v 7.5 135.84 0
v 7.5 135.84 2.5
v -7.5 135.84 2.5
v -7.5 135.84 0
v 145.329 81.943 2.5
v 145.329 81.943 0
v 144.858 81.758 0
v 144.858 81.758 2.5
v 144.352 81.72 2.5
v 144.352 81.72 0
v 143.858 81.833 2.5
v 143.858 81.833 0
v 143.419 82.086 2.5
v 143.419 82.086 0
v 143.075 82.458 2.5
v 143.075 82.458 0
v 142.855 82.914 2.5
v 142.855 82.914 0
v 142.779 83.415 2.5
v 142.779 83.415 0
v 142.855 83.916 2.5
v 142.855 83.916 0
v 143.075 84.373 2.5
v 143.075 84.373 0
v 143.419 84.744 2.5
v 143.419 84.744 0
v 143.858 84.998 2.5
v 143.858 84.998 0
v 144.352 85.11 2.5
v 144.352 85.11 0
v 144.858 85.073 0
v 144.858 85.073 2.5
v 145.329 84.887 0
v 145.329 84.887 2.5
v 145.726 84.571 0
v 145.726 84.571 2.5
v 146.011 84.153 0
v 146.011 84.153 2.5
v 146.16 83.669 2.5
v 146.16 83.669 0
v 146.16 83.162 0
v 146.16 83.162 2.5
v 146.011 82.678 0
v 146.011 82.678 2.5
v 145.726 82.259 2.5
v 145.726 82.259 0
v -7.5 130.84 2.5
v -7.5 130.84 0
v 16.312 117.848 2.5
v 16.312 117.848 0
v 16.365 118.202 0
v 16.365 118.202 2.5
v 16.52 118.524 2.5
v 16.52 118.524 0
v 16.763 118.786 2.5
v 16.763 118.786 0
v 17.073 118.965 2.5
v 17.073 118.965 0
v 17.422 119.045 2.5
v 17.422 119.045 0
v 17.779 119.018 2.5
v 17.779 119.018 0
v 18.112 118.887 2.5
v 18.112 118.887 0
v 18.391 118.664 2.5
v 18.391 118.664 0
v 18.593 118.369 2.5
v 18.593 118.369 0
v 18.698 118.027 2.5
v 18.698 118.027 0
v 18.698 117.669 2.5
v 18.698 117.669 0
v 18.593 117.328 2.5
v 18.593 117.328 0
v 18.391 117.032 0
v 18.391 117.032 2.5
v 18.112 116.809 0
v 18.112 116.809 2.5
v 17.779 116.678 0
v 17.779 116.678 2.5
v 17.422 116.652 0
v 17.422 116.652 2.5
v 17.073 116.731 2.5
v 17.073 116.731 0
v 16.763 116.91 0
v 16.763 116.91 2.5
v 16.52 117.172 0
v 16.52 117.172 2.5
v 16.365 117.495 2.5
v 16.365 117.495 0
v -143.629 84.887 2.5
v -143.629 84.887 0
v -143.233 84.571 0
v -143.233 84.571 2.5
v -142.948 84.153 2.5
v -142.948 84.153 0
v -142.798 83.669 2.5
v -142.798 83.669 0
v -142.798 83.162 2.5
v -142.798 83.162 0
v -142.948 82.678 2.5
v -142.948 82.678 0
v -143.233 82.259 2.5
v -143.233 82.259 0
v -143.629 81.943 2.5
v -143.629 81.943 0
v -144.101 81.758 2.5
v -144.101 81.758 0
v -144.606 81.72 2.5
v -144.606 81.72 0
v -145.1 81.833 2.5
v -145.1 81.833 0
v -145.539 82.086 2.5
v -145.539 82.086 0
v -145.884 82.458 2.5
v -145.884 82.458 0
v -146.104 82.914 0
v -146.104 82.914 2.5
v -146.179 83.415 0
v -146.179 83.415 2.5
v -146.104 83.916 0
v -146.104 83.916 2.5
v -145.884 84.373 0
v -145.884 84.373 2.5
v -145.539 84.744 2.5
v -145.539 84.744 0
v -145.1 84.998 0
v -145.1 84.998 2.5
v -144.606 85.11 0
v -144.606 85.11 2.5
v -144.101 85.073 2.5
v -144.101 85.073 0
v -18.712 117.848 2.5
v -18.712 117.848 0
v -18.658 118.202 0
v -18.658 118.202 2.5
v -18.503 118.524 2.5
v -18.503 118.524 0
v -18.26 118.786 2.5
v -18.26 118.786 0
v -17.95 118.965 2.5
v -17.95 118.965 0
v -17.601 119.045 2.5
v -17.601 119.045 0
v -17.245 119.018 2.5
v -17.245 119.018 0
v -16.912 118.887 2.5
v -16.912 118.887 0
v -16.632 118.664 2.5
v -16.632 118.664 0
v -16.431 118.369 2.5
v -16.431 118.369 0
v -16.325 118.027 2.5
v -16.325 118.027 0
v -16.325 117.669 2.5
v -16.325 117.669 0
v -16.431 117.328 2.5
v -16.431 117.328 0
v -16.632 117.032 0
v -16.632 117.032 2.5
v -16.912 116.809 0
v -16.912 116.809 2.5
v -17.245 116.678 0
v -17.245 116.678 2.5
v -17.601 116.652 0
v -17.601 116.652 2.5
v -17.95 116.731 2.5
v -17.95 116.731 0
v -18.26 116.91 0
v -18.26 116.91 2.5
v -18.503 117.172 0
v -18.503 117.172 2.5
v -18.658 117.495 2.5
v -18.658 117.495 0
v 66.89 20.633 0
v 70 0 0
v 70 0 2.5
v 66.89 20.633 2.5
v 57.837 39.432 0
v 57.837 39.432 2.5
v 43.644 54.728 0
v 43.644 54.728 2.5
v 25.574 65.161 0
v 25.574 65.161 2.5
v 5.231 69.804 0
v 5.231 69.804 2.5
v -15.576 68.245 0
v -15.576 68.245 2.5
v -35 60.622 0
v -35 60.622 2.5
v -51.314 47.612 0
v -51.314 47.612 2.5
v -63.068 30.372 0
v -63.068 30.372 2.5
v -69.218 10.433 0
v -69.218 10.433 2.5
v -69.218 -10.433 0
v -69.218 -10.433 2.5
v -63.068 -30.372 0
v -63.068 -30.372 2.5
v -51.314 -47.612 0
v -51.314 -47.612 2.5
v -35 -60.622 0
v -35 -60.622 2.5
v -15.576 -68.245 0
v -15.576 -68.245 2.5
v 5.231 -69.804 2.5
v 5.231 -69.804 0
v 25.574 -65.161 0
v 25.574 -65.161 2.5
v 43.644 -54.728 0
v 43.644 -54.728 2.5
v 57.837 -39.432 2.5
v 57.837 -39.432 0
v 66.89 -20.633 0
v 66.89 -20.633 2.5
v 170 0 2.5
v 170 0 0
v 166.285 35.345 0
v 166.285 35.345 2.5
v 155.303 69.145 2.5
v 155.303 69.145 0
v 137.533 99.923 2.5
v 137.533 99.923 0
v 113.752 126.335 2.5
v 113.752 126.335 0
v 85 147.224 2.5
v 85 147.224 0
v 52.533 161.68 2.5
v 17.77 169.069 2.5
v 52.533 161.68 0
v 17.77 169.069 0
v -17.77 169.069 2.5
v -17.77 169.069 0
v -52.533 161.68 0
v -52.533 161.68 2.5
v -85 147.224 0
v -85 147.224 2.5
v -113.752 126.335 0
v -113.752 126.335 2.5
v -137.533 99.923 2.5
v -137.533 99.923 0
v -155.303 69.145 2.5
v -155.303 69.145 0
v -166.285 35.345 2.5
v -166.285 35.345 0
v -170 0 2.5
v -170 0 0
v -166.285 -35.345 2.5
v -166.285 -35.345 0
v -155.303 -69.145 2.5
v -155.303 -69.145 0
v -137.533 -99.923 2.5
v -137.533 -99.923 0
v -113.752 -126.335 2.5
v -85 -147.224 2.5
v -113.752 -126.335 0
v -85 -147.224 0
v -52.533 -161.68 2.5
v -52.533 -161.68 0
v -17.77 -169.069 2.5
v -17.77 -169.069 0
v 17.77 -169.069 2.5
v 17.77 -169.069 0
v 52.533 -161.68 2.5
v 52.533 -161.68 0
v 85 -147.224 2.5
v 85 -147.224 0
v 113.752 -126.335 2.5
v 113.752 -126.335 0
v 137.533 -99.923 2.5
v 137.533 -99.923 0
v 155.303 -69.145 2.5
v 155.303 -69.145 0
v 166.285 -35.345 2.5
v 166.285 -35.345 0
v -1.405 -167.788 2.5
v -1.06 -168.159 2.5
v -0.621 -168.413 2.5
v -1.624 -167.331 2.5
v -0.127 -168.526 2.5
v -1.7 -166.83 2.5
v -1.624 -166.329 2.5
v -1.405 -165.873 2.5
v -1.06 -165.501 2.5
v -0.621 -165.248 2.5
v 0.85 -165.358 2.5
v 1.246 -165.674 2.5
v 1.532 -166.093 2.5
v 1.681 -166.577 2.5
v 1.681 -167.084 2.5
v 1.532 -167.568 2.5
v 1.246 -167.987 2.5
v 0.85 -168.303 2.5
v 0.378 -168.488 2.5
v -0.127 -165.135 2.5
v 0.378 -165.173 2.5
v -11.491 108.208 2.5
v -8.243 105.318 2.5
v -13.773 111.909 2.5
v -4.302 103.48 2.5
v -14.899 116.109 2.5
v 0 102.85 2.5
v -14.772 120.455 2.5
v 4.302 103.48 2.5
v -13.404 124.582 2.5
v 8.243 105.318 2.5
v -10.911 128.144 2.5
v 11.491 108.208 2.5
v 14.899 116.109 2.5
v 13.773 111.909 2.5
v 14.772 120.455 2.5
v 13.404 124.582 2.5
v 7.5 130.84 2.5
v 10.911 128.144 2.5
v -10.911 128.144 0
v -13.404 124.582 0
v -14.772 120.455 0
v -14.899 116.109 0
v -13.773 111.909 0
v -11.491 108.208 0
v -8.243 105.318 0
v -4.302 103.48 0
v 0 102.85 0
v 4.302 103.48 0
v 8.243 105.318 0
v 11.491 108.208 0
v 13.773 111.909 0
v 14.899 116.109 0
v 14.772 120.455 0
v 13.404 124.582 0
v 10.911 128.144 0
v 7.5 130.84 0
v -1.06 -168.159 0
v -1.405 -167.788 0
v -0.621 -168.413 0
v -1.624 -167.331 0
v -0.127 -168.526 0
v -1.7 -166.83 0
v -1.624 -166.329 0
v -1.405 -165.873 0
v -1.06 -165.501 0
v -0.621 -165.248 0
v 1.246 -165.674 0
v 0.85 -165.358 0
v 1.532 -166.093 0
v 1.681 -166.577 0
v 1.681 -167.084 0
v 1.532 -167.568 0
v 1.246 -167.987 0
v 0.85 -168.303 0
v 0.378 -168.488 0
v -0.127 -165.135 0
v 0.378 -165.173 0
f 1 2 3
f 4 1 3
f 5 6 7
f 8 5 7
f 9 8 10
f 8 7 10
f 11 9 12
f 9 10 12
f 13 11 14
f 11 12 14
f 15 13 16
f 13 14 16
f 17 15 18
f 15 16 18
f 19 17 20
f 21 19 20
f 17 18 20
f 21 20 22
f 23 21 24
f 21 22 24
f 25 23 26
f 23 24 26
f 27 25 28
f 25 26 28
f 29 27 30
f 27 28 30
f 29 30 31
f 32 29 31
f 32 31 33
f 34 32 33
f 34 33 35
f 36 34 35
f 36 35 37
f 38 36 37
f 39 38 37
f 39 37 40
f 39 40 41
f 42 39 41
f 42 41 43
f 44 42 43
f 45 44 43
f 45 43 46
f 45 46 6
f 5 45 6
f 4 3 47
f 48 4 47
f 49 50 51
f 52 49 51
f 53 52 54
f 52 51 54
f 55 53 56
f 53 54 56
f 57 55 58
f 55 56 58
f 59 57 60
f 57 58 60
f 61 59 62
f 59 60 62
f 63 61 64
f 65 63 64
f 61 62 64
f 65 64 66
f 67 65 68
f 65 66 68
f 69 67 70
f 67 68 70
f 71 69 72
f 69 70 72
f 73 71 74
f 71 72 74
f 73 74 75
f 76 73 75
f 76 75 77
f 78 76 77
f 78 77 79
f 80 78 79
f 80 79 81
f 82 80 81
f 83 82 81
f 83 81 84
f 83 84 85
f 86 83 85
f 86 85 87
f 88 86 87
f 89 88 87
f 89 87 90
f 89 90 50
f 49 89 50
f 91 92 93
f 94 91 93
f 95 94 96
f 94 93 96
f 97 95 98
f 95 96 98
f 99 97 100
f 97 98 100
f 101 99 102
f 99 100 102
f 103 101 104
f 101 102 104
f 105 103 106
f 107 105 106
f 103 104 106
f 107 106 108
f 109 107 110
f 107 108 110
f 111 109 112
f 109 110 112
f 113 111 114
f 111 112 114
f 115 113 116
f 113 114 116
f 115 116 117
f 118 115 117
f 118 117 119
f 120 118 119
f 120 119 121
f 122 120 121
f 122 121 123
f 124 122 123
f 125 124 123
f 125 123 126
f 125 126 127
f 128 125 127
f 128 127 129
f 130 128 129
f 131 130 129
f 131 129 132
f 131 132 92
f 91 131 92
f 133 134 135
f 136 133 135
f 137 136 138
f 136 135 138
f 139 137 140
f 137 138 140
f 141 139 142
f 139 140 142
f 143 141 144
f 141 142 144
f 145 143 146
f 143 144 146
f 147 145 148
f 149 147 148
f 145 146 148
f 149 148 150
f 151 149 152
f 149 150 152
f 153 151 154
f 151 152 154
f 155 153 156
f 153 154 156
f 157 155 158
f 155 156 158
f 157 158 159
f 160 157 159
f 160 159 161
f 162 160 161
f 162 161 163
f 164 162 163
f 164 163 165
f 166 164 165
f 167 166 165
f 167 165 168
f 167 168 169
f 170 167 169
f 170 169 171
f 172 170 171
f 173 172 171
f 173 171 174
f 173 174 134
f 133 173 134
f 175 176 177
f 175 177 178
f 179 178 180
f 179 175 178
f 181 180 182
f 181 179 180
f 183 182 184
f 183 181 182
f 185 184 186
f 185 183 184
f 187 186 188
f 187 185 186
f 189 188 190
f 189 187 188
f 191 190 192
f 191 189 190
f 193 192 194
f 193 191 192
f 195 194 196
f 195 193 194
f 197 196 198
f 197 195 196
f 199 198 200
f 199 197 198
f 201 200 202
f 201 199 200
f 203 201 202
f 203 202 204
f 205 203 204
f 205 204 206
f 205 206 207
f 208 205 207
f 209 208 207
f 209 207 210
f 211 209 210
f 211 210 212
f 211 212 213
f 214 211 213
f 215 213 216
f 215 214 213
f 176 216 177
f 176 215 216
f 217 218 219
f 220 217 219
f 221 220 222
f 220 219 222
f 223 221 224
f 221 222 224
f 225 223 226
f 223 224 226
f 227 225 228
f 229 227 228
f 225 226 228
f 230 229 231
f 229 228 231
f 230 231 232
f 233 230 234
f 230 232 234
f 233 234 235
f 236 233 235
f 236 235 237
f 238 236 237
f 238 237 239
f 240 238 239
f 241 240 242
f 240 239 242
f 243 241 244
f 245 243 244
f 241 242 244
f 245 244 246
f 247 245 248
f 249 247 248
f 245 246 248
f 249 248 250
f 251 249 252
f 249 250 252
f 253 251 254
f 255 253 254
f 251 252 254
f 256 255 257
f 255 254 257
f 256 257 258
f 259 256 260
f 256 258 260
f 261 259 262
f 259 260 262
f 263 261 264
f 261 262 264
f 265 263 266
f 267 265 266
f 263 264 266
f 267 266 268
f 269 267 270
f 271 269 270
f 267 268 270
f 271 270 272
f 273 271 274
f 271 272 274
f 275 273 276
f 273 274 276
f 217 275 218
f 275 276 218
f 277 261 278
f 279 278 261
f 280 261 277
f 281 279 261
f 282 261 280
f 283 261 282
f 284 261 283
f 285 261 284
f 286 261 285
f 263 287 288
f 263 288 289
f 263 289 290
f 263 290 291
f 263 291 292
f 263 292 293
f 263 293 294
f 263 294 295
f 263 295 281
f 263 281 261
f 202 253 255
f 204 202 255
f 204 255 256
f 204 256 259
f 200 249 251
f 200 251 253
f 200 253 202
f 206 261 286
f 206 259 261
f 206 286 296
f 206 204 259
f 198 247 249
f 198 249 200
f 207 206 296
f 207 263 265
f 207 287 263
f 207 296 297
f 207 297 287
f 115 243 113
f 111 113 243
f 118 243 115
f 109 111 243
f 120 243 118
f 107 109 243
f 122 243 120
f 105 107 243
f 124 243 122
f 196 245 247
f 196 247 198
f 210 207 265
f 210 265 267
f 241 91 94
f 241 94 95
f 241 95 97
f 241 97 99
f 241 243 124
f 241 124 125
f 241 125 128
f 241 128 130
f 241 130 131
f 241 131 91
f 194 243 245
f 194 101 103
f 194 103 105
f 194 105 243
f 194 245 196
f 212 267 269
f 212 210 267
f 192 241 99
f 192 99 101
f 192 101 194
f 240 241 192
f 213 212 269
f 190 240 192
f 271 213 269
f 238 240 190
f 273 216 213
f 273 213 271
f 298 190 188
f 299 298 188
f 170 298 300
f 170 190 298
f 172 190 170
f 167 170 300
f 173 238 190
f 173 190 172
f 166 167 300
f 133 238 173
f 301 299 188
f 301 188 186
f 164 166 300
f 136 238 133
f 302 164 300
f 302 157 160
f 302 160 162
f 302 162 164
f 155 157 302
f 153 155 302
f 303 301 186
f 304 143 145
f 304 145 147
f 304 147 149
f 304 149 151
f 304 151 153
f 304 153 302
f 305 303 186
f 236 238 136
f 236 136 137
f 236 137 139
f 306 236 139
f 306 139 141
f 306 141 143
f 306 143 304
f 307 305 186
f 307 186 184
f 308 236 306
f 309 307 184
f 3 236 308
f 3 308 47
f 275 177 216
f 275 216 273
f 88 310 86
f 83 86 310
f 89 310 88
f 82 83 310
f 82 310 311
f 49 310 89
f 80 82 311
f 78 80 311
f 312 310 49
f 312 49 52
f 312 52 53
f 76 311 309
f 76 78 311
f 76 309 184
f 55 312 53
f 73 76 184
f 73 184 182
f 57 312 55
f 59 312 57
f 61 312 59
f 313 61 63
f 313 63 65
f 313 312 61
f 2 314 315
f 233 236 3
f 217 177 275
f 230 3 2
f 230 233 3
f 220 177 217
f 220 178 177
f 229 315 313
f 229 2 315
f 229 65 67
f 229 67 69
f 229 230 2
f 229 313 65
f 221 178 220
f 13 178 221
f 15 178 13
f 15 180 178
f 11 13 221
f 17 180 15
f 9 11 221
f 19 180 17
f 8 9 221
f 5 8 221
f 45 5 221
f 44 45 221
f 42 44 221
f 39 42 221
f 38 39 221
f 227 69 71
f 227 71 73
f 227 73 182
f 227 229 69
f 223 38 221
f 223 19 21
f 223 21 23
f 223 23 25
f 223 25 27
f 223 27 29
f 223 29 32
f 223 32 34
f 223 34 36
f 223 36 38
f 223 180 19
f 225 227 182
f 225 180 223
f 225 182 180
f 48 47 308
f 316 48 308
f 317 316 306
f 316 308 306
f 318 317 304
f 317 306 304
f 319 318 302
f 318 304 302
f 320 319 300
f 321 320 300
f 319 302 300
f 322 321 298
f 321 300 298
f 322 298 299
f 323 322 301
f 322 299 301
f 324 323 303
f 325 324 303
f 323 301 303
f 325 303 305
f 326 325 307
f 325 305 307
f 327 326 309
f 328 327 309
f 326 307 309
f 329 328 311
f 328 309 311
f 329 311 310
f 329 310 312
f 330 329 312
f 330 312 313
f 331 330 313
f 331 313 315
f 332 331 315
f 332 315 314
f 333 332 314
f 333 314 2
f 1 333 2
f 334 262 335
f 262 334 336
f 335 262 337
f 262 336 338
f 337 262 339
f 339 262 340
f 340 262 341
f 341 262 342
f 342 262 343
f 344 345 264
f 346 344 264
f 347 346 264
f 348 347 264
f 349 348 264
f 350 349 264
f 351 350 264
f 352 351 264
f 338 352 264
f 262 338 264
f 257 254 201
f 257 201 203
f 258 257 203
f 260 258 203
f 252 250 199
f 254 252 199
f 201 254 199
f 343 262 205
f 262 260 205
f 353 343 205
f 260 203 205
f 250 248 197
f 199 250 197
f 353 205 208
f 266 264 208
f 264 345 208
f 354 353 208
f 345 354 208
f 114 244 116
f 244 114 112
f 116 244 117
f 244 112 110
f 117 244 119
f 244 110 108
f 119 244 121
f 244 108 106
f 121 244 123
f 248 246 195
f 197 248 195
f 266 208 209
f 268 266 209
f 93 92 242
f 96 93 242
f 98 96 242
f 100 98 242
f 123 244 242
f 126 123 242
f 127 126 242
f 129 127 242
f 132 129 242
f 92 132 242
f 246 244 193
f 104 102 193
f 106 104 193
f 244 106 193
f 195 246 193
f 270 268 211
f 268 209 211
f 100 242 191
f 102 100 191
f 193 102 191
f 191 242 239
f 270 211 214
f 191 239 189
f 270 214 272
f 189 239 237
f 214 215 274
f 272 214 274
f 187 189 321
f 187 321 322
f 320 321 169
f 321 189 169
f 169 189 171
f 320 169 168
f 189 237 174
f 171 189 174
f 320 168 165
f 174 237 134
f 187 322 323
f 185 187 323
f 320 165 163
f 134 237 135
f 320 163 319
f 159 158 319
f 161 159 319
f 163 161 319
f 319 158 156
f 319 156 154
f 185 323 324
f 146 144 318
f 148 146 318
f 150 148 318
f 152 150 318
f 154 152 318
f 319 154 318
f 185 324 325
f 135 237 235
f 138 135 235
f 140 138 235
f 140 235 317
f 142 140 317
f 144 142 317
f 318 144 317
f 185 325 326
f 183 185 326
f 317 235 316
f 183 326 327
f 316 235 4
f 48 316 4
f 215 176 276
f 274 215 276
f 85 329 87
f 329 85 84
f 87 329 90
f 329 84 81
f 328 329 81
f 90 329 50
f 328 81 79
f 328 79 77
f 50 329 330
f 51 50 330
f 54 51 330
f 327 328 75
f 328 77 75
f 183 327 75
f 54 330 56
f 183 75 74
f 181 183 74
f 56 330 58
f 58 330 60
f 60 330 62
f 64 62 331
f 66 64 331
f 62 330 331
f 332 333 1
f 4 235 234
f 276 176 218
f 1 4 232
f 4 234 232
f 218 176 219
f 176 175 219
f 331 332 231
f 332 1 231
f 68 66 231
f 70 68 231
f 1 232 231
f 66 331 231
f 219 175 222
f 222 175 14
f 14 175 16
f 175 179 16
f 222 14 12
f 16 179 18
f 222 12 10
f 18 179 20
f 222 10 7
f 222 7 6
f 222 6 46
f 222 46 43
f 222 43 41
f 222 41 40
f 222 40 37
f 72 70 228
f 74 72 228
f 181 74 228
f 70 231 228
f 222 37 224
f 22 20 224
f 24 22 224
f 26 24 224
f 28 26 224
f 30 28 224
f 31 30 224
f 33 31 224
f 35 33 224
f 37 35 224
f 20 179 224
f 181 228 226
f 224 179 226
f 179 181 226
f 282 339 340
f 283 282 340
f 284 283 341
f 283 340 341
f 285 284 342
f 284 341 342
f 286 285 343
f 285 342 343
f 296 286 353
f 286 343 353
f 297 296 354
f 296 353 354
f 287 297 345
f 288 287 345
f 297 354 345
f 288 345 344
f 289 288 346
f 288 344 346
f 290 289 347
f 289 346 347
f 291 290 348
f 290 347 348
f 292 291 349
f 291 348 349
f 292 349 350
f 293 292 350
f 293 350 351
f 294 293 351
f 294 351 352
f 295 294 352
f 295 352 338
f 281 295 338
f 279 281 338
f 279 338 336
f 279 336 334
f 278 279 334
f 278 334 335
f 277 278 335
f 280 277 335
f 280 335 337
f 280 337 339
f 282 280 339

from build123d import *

# Parameters (mm, degrees)
SCHIZZO1_R                   = 170
SCHIZZO1_R_2                 = 70
ESTRUSIONE_ESTRUSIONE1_DEPTH = 2.5
TAGLIO_ESTRUSIONE1_DEPTH     = 2.5
FORO_PER_VITE_M2_1_D         = 2.4
FORO_PER_VITE_M3_1_D         = 3.4
RIPETIZIONECIRCOLARE1_COUNT  = 3


with BuildPart() as part:
    # Schizzo1 → Estrusione-Estrusione1 (new body)
    with BuildSketch(Plane.XY):
        Circle(SCHIZZO1_R)
        Circle(SCHIZZO1_R_2, mode=Mode.SUBTRACT)
    extrude(amount=ESTRUSIONE_ESTRUSIONE1_DEPTH)

    # Schizzo3 → Taglio-Estrusione1 (cut)
    with BuildSketch(Plane.XY.offset(2.5)):
        with BuildLine():
            Line((7.5, 135.840381057), (-7.5, 135.840381057))
            Line((-7.5, 135.840381057), (-7.5, 130.840381057))
            ThreePointArc((-7.5, 130.840381057), (0, 102.85), (7.5, 130.840381057))
            Line((7.5, 130.840381057), (7.5, 135.840381057))
        make_face()
    extrude(amount=-TAGLIO_ESTRUSIONE1_DEPTH, mode=Mode.SUBTRACT)

    # Foro per Vite M2-1 (through all)
    with Locations(Plane.XY.offset(2.5)):
        with Locations((17.511664312, 117.848267331), (-17.511664312, 117.848267331)):
            Hole(FORO_PER_VITE_M2_1_D / 2)

    # Foro per Vite M3-1 (through all)
    with Locations(Plane.XY.offset(2.5)):
        with Locations((0, -166.830362559)):
            foro_per_vite_m3_1 = Hole(FORO_PER_VITE_M3_1_D / 2)

    # RipetizioneCircolare1: Foro per Vite M3-1 ×3 about axis
    ripetizionecircolare1_axis = Axis((0, 0, 0), (0, 0, 1))
    for i in range(1, RIPETIZIONECIRCOLARE1_COUNT):
        add(foro_per_vite_m3_1.rotate(ripetizionecircolare1_axis, i * 360 / RIPETIZIONECIRCOLARE1_COUNT), mode=Mode.SUBTRACT)


solid = part.part
